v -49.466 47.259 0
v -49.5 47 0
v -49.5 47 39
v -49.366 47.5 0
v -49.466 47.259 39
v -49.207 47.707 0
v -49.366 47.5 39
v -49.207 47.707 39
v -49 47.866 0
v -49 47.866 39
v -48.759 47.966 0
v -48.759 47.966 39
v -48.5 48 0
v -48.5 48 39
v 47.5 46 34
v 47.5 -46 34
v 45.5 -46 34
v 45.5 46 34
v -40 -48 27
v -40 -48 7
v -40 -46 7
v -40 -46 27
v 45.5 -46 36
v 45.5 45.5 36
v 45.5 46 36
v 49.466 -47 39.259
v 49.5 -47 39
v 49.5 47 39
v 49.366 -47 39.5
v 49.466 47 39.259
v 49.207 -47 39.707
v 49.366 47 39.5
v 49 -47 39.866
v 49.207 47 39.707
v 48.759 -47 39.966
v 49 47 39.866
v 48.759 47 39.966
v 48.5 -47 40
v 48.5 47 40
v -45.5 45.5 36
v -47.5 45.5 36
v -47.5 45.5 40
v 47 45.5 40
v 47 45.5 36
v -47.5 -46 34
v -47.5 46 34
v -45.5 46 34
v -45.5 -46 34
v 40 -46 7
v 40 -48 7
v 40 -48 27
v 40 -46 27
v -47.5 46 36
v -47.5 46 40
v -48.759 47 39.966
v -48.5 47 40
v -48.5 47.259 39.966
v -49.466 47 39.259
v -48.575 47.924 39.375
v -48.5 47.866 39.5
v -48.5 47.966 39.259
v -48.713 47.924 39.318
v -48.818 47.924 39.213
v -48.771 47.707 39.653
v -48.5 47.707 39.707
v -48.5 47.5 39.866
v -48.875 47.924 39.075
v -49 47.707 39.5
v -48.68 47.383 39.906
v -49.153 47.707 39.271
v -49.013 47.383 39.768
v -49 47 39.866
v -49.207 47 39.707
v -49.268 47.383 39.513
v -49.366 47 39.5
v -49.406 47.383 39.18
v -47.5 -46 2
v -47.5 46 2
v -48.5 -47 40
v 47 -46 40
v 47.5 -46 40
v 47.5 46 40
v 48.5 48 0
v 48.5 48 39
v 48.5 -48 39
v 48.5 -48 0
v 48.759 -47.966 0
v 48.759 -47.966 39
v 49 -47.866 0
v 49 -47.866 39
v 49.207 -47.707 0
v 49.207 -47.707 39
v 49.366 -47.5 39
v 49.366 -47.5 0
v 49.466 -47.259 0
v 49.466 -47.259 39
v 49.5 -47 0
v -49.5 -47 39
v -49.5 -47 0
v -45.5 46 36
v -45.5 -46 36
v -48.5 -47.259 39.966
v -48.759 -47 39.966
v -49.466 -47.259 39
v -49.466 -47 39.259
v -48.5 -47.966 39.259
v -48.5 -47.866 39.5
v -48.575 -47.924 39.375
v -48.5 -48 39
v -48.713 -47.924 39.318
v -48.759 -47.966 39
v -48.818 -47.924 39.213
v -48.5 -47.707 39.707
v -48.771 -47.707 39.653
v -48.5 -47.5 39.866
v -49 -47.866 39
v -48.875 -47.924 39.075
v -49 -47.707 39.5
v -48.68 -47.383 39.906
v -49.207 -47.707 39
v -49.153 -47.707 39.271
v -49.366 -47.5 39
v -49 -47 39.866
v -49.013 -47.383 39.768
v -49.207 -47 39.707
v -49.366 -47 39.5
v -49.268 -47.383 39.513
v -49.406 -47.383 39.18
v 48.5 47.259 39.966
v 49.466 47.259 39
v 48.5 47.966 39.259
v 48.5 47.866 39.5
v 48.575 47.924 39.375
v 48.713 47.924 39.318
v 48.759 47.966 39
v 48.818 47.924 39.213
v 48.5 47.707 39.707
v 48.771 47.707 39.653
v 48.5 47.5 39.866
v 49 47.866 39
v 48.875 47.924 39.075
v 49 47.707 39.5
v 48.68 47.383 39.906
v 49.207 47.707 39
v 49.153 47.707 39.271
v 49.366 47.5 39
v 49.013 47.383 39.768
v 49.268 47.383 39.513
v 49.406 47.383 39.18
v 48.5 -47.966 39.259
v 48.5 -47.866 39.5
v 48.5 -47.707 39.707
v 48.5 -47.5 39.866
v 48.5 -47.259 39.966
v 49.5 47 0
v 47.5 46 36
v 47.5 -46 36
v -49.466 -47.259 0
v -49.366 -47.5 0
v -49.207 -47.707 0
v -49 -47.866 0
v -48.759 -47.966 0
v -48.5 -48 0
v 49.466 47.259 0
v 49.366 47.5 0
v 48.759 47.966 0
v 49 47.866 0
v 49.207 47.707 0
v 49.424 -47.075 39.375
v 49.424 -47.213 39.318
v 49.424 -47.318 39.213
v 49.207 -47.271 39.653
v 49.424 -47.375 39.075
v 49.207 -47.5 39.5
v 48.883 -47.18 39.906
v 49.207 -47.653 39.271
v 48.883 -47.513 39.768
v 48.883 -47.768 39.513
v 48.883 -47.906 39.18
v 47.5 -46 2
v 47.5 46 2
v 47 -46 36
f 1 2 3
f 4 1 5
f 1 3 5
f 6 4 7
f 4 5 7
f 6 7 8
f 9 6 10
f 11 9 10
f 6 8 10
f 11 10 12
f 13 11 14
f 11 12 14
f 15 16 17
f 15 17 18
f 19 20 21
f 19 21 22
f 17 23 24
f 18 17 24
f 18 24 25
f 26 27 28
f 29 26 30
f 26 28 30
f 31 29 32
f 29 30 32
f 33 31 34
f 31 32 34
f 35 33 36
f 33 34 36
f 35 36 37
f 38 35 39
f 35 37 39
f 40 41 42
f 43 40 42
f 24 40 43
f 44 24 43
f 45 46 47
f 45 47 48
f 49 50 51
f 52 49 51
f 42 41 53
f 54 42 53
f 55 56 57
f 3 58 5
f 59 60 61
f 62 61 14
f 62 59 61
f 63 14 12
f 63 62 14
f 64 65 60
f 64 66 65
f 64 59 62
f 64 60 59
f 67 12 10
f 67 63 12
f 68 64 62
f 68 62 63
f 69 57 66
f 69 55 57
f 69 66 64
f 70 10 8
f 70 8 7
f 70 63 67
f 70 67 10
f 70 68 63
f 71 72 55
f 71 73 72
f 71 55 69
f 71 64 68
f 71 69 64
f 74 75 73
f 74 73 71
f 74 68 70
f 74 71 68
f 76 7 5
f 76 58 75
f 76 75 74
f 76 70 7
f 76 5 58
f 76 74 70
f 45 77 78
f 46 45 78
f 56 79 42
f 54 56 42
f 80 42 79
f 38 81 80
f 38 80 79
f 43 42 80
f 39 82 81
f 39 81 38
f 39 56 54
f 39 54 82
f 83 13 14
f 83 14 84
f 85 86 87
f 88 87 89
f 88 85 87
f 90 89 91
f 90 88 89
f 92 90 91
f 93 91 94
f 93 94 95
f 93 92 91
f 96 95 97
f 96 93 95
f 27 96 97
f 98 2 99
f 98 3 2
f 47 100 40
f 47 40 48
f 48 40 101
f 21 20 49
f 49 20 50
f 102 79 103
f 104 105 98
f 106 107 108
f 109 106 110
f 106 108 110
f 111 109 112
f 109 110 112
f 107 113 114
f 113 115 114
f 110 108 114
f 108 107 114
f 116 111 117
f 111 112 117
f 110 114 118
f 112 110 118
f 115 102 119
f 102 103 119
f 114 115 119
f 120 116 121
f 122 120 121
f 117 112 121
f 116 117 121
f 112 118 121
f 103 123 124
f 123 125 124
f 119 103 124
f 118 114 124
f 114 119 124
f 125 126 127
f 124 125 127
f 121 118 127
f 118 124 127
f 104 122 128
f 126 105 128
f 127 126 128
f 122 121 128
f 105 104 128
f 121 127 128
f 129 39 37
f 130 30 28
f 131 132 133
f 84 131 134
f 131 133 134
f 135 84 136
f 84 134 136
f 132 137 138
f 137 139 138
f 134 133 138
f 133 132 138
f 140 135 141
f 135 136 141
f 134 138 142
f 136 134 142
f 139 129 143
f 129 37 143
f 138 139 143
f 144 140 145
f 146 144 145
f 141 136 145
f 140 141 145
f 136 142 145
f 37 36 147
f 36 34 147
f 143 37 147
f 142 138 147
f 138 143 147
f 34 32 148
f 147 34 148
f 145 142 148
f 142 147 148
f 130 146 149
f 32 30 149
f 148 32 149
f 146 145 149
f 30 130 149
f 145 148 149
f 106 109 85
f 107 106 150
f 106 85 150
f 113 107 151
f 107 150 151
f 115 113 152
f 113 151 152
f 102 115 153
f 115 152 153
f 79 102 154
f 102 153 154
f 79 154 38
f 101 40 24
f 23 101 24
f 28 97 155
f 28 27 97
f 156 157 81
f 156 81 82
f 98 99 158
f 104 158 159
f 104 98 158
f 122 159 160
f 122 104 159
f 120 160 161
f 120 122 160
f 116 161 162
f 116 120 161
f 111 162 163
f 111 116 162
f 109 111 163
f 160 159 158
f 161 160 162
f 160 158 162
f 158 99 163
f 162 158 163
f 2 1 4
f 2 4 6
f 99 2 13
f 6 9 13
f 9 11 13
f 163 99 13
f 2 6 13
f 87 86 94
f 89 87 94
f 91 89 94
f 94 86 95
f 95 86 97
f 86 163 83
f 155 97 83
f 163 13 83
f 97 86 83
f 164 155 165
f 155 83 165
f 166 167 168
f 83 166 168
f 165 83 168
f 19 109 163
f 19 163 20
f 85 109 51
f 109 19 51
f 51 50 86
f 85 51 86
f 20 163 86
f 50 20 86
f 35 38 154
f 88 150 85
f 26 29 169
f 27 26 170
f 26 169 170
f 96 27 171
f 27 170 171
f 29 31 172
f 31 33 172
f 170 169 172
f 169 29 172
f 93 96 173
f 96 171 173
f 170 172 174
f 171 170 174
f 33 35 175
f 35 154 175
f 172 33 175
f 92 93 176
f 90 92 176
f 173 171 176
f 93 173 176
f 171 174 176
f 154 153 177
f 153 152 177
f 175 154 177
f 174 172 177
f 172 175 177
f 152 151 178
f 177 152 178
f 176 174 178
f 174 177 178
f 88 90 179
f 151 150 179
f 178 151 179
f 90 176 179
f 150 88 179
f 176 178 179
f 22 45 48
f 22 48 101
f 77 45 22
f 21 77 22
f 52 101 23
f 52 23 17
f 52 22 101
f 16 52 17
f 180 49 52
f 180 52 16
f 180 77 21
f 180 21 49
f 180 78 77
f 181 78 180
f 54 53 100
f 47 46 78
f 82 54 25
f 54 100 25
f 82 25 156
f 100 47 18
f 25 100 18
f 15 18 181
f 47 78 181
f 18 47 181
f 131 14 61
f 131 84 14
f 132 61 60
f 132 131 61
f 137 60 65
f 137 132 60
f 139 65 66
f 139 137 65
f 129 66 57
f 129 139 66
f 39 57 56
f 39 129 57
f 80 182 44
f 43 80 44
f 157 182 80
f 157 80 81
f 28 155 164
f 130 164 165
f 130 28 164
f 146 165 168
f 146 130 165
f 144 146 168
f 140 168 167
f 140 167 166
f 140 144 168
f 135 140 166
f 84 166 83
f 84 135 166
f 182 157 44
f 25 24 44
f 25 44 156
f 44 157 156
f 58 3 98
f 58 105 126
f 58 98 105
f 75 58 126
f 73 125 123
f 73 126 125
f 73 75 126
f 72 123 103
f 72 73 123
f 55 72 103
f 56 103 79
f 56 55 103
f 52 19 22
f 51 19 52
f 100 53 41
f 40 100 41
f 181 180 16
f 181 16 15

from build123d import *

# Parameters (mm, degrees)
F0_W      = 99
F0_H      = 96
F0_W_2    = 95
F0_H_2    = 92
F1_DEPTH  = 40
F2_DEPTH  = 2
F3_W      = 80
F3_H      = 20
F4_DEPTH  = 2
F5_R      = 1
F6_W      = 94
F6_H      = 2
F7_DEPTH  = 4
F8_W      = 94
F8_H      = 2
F9_DEPTH  = 4
F10_W     = 94.5
F10_H     = 91.5
F11_DEPTH = 4


with BuildPart() as f1:
    # F0 (on Top) → F1 (new body)
    with BuildSketch(Plane.XY):
        Rectangle(F0_W, F0_H)
        Rectangle(F0_W_2, F0_H_2, mode=Mode.SUBTRACT)
    extrude(amount=F1_DEPTH)

    # F0 (on Top) → F2 (join)
    with BuildSketch(Plane.XY):
        Rectangle(F0_W_2, F0_H_2)
    extrude(amount=F2_DEPTH)

    # F3 (on face) → F4 (cut)
    with BuildSketch(Plane.XZ.offset(48)):
        with Locations((0, 17)):
            Rectangle(F3_W, F3_H)
    extrude(amount=-F4_DEPTH, mode=Mode.SUBTRACT)

    # F5
    f5_edges = [f1.edges().sort_by_distance(p)[0] for p in [
        (-49.5, 0, 40),
        (0, -48, 40),
        (49.5, 0, 40),
        (0, 48, 40),
        (-49.5, -48, 20),
        (49.5, -48, 20),
        (49.5, 48, 20),
        (-49.5, 48, 20),
    ]]
    fillet(f5_edges, radius=F5_R)

    # F6 (on face) → F7 (join)
    with BuildSketch(Plane(origin=(-49.5, 0, 0), x_dir=(0, -1, 0), z_dir=(-1, 0, 0))):
        with Locations((0, 35)):
            Rectangle(F6_W, F6_H)
    extrude(amount=-F7_DEPTH)

    # F8 (on face) → F9 (join)
    with BuildSketch(Plane.YZ.offset(49.5)):
        with Locations((0, 35)):
            Rectangle(F8_W, F8_H)
    extrude(amount=-F9_DEPTH)

    # F10 (on face) → F11 (join)
    with BuildSketch(Plane.XY.offset(36)):
        with Locations((-0.25, -0.25)):
            Rectangle(F10_W, F10_H)
    extrude(amount=F11_DEPTH)


solid = f1.part
